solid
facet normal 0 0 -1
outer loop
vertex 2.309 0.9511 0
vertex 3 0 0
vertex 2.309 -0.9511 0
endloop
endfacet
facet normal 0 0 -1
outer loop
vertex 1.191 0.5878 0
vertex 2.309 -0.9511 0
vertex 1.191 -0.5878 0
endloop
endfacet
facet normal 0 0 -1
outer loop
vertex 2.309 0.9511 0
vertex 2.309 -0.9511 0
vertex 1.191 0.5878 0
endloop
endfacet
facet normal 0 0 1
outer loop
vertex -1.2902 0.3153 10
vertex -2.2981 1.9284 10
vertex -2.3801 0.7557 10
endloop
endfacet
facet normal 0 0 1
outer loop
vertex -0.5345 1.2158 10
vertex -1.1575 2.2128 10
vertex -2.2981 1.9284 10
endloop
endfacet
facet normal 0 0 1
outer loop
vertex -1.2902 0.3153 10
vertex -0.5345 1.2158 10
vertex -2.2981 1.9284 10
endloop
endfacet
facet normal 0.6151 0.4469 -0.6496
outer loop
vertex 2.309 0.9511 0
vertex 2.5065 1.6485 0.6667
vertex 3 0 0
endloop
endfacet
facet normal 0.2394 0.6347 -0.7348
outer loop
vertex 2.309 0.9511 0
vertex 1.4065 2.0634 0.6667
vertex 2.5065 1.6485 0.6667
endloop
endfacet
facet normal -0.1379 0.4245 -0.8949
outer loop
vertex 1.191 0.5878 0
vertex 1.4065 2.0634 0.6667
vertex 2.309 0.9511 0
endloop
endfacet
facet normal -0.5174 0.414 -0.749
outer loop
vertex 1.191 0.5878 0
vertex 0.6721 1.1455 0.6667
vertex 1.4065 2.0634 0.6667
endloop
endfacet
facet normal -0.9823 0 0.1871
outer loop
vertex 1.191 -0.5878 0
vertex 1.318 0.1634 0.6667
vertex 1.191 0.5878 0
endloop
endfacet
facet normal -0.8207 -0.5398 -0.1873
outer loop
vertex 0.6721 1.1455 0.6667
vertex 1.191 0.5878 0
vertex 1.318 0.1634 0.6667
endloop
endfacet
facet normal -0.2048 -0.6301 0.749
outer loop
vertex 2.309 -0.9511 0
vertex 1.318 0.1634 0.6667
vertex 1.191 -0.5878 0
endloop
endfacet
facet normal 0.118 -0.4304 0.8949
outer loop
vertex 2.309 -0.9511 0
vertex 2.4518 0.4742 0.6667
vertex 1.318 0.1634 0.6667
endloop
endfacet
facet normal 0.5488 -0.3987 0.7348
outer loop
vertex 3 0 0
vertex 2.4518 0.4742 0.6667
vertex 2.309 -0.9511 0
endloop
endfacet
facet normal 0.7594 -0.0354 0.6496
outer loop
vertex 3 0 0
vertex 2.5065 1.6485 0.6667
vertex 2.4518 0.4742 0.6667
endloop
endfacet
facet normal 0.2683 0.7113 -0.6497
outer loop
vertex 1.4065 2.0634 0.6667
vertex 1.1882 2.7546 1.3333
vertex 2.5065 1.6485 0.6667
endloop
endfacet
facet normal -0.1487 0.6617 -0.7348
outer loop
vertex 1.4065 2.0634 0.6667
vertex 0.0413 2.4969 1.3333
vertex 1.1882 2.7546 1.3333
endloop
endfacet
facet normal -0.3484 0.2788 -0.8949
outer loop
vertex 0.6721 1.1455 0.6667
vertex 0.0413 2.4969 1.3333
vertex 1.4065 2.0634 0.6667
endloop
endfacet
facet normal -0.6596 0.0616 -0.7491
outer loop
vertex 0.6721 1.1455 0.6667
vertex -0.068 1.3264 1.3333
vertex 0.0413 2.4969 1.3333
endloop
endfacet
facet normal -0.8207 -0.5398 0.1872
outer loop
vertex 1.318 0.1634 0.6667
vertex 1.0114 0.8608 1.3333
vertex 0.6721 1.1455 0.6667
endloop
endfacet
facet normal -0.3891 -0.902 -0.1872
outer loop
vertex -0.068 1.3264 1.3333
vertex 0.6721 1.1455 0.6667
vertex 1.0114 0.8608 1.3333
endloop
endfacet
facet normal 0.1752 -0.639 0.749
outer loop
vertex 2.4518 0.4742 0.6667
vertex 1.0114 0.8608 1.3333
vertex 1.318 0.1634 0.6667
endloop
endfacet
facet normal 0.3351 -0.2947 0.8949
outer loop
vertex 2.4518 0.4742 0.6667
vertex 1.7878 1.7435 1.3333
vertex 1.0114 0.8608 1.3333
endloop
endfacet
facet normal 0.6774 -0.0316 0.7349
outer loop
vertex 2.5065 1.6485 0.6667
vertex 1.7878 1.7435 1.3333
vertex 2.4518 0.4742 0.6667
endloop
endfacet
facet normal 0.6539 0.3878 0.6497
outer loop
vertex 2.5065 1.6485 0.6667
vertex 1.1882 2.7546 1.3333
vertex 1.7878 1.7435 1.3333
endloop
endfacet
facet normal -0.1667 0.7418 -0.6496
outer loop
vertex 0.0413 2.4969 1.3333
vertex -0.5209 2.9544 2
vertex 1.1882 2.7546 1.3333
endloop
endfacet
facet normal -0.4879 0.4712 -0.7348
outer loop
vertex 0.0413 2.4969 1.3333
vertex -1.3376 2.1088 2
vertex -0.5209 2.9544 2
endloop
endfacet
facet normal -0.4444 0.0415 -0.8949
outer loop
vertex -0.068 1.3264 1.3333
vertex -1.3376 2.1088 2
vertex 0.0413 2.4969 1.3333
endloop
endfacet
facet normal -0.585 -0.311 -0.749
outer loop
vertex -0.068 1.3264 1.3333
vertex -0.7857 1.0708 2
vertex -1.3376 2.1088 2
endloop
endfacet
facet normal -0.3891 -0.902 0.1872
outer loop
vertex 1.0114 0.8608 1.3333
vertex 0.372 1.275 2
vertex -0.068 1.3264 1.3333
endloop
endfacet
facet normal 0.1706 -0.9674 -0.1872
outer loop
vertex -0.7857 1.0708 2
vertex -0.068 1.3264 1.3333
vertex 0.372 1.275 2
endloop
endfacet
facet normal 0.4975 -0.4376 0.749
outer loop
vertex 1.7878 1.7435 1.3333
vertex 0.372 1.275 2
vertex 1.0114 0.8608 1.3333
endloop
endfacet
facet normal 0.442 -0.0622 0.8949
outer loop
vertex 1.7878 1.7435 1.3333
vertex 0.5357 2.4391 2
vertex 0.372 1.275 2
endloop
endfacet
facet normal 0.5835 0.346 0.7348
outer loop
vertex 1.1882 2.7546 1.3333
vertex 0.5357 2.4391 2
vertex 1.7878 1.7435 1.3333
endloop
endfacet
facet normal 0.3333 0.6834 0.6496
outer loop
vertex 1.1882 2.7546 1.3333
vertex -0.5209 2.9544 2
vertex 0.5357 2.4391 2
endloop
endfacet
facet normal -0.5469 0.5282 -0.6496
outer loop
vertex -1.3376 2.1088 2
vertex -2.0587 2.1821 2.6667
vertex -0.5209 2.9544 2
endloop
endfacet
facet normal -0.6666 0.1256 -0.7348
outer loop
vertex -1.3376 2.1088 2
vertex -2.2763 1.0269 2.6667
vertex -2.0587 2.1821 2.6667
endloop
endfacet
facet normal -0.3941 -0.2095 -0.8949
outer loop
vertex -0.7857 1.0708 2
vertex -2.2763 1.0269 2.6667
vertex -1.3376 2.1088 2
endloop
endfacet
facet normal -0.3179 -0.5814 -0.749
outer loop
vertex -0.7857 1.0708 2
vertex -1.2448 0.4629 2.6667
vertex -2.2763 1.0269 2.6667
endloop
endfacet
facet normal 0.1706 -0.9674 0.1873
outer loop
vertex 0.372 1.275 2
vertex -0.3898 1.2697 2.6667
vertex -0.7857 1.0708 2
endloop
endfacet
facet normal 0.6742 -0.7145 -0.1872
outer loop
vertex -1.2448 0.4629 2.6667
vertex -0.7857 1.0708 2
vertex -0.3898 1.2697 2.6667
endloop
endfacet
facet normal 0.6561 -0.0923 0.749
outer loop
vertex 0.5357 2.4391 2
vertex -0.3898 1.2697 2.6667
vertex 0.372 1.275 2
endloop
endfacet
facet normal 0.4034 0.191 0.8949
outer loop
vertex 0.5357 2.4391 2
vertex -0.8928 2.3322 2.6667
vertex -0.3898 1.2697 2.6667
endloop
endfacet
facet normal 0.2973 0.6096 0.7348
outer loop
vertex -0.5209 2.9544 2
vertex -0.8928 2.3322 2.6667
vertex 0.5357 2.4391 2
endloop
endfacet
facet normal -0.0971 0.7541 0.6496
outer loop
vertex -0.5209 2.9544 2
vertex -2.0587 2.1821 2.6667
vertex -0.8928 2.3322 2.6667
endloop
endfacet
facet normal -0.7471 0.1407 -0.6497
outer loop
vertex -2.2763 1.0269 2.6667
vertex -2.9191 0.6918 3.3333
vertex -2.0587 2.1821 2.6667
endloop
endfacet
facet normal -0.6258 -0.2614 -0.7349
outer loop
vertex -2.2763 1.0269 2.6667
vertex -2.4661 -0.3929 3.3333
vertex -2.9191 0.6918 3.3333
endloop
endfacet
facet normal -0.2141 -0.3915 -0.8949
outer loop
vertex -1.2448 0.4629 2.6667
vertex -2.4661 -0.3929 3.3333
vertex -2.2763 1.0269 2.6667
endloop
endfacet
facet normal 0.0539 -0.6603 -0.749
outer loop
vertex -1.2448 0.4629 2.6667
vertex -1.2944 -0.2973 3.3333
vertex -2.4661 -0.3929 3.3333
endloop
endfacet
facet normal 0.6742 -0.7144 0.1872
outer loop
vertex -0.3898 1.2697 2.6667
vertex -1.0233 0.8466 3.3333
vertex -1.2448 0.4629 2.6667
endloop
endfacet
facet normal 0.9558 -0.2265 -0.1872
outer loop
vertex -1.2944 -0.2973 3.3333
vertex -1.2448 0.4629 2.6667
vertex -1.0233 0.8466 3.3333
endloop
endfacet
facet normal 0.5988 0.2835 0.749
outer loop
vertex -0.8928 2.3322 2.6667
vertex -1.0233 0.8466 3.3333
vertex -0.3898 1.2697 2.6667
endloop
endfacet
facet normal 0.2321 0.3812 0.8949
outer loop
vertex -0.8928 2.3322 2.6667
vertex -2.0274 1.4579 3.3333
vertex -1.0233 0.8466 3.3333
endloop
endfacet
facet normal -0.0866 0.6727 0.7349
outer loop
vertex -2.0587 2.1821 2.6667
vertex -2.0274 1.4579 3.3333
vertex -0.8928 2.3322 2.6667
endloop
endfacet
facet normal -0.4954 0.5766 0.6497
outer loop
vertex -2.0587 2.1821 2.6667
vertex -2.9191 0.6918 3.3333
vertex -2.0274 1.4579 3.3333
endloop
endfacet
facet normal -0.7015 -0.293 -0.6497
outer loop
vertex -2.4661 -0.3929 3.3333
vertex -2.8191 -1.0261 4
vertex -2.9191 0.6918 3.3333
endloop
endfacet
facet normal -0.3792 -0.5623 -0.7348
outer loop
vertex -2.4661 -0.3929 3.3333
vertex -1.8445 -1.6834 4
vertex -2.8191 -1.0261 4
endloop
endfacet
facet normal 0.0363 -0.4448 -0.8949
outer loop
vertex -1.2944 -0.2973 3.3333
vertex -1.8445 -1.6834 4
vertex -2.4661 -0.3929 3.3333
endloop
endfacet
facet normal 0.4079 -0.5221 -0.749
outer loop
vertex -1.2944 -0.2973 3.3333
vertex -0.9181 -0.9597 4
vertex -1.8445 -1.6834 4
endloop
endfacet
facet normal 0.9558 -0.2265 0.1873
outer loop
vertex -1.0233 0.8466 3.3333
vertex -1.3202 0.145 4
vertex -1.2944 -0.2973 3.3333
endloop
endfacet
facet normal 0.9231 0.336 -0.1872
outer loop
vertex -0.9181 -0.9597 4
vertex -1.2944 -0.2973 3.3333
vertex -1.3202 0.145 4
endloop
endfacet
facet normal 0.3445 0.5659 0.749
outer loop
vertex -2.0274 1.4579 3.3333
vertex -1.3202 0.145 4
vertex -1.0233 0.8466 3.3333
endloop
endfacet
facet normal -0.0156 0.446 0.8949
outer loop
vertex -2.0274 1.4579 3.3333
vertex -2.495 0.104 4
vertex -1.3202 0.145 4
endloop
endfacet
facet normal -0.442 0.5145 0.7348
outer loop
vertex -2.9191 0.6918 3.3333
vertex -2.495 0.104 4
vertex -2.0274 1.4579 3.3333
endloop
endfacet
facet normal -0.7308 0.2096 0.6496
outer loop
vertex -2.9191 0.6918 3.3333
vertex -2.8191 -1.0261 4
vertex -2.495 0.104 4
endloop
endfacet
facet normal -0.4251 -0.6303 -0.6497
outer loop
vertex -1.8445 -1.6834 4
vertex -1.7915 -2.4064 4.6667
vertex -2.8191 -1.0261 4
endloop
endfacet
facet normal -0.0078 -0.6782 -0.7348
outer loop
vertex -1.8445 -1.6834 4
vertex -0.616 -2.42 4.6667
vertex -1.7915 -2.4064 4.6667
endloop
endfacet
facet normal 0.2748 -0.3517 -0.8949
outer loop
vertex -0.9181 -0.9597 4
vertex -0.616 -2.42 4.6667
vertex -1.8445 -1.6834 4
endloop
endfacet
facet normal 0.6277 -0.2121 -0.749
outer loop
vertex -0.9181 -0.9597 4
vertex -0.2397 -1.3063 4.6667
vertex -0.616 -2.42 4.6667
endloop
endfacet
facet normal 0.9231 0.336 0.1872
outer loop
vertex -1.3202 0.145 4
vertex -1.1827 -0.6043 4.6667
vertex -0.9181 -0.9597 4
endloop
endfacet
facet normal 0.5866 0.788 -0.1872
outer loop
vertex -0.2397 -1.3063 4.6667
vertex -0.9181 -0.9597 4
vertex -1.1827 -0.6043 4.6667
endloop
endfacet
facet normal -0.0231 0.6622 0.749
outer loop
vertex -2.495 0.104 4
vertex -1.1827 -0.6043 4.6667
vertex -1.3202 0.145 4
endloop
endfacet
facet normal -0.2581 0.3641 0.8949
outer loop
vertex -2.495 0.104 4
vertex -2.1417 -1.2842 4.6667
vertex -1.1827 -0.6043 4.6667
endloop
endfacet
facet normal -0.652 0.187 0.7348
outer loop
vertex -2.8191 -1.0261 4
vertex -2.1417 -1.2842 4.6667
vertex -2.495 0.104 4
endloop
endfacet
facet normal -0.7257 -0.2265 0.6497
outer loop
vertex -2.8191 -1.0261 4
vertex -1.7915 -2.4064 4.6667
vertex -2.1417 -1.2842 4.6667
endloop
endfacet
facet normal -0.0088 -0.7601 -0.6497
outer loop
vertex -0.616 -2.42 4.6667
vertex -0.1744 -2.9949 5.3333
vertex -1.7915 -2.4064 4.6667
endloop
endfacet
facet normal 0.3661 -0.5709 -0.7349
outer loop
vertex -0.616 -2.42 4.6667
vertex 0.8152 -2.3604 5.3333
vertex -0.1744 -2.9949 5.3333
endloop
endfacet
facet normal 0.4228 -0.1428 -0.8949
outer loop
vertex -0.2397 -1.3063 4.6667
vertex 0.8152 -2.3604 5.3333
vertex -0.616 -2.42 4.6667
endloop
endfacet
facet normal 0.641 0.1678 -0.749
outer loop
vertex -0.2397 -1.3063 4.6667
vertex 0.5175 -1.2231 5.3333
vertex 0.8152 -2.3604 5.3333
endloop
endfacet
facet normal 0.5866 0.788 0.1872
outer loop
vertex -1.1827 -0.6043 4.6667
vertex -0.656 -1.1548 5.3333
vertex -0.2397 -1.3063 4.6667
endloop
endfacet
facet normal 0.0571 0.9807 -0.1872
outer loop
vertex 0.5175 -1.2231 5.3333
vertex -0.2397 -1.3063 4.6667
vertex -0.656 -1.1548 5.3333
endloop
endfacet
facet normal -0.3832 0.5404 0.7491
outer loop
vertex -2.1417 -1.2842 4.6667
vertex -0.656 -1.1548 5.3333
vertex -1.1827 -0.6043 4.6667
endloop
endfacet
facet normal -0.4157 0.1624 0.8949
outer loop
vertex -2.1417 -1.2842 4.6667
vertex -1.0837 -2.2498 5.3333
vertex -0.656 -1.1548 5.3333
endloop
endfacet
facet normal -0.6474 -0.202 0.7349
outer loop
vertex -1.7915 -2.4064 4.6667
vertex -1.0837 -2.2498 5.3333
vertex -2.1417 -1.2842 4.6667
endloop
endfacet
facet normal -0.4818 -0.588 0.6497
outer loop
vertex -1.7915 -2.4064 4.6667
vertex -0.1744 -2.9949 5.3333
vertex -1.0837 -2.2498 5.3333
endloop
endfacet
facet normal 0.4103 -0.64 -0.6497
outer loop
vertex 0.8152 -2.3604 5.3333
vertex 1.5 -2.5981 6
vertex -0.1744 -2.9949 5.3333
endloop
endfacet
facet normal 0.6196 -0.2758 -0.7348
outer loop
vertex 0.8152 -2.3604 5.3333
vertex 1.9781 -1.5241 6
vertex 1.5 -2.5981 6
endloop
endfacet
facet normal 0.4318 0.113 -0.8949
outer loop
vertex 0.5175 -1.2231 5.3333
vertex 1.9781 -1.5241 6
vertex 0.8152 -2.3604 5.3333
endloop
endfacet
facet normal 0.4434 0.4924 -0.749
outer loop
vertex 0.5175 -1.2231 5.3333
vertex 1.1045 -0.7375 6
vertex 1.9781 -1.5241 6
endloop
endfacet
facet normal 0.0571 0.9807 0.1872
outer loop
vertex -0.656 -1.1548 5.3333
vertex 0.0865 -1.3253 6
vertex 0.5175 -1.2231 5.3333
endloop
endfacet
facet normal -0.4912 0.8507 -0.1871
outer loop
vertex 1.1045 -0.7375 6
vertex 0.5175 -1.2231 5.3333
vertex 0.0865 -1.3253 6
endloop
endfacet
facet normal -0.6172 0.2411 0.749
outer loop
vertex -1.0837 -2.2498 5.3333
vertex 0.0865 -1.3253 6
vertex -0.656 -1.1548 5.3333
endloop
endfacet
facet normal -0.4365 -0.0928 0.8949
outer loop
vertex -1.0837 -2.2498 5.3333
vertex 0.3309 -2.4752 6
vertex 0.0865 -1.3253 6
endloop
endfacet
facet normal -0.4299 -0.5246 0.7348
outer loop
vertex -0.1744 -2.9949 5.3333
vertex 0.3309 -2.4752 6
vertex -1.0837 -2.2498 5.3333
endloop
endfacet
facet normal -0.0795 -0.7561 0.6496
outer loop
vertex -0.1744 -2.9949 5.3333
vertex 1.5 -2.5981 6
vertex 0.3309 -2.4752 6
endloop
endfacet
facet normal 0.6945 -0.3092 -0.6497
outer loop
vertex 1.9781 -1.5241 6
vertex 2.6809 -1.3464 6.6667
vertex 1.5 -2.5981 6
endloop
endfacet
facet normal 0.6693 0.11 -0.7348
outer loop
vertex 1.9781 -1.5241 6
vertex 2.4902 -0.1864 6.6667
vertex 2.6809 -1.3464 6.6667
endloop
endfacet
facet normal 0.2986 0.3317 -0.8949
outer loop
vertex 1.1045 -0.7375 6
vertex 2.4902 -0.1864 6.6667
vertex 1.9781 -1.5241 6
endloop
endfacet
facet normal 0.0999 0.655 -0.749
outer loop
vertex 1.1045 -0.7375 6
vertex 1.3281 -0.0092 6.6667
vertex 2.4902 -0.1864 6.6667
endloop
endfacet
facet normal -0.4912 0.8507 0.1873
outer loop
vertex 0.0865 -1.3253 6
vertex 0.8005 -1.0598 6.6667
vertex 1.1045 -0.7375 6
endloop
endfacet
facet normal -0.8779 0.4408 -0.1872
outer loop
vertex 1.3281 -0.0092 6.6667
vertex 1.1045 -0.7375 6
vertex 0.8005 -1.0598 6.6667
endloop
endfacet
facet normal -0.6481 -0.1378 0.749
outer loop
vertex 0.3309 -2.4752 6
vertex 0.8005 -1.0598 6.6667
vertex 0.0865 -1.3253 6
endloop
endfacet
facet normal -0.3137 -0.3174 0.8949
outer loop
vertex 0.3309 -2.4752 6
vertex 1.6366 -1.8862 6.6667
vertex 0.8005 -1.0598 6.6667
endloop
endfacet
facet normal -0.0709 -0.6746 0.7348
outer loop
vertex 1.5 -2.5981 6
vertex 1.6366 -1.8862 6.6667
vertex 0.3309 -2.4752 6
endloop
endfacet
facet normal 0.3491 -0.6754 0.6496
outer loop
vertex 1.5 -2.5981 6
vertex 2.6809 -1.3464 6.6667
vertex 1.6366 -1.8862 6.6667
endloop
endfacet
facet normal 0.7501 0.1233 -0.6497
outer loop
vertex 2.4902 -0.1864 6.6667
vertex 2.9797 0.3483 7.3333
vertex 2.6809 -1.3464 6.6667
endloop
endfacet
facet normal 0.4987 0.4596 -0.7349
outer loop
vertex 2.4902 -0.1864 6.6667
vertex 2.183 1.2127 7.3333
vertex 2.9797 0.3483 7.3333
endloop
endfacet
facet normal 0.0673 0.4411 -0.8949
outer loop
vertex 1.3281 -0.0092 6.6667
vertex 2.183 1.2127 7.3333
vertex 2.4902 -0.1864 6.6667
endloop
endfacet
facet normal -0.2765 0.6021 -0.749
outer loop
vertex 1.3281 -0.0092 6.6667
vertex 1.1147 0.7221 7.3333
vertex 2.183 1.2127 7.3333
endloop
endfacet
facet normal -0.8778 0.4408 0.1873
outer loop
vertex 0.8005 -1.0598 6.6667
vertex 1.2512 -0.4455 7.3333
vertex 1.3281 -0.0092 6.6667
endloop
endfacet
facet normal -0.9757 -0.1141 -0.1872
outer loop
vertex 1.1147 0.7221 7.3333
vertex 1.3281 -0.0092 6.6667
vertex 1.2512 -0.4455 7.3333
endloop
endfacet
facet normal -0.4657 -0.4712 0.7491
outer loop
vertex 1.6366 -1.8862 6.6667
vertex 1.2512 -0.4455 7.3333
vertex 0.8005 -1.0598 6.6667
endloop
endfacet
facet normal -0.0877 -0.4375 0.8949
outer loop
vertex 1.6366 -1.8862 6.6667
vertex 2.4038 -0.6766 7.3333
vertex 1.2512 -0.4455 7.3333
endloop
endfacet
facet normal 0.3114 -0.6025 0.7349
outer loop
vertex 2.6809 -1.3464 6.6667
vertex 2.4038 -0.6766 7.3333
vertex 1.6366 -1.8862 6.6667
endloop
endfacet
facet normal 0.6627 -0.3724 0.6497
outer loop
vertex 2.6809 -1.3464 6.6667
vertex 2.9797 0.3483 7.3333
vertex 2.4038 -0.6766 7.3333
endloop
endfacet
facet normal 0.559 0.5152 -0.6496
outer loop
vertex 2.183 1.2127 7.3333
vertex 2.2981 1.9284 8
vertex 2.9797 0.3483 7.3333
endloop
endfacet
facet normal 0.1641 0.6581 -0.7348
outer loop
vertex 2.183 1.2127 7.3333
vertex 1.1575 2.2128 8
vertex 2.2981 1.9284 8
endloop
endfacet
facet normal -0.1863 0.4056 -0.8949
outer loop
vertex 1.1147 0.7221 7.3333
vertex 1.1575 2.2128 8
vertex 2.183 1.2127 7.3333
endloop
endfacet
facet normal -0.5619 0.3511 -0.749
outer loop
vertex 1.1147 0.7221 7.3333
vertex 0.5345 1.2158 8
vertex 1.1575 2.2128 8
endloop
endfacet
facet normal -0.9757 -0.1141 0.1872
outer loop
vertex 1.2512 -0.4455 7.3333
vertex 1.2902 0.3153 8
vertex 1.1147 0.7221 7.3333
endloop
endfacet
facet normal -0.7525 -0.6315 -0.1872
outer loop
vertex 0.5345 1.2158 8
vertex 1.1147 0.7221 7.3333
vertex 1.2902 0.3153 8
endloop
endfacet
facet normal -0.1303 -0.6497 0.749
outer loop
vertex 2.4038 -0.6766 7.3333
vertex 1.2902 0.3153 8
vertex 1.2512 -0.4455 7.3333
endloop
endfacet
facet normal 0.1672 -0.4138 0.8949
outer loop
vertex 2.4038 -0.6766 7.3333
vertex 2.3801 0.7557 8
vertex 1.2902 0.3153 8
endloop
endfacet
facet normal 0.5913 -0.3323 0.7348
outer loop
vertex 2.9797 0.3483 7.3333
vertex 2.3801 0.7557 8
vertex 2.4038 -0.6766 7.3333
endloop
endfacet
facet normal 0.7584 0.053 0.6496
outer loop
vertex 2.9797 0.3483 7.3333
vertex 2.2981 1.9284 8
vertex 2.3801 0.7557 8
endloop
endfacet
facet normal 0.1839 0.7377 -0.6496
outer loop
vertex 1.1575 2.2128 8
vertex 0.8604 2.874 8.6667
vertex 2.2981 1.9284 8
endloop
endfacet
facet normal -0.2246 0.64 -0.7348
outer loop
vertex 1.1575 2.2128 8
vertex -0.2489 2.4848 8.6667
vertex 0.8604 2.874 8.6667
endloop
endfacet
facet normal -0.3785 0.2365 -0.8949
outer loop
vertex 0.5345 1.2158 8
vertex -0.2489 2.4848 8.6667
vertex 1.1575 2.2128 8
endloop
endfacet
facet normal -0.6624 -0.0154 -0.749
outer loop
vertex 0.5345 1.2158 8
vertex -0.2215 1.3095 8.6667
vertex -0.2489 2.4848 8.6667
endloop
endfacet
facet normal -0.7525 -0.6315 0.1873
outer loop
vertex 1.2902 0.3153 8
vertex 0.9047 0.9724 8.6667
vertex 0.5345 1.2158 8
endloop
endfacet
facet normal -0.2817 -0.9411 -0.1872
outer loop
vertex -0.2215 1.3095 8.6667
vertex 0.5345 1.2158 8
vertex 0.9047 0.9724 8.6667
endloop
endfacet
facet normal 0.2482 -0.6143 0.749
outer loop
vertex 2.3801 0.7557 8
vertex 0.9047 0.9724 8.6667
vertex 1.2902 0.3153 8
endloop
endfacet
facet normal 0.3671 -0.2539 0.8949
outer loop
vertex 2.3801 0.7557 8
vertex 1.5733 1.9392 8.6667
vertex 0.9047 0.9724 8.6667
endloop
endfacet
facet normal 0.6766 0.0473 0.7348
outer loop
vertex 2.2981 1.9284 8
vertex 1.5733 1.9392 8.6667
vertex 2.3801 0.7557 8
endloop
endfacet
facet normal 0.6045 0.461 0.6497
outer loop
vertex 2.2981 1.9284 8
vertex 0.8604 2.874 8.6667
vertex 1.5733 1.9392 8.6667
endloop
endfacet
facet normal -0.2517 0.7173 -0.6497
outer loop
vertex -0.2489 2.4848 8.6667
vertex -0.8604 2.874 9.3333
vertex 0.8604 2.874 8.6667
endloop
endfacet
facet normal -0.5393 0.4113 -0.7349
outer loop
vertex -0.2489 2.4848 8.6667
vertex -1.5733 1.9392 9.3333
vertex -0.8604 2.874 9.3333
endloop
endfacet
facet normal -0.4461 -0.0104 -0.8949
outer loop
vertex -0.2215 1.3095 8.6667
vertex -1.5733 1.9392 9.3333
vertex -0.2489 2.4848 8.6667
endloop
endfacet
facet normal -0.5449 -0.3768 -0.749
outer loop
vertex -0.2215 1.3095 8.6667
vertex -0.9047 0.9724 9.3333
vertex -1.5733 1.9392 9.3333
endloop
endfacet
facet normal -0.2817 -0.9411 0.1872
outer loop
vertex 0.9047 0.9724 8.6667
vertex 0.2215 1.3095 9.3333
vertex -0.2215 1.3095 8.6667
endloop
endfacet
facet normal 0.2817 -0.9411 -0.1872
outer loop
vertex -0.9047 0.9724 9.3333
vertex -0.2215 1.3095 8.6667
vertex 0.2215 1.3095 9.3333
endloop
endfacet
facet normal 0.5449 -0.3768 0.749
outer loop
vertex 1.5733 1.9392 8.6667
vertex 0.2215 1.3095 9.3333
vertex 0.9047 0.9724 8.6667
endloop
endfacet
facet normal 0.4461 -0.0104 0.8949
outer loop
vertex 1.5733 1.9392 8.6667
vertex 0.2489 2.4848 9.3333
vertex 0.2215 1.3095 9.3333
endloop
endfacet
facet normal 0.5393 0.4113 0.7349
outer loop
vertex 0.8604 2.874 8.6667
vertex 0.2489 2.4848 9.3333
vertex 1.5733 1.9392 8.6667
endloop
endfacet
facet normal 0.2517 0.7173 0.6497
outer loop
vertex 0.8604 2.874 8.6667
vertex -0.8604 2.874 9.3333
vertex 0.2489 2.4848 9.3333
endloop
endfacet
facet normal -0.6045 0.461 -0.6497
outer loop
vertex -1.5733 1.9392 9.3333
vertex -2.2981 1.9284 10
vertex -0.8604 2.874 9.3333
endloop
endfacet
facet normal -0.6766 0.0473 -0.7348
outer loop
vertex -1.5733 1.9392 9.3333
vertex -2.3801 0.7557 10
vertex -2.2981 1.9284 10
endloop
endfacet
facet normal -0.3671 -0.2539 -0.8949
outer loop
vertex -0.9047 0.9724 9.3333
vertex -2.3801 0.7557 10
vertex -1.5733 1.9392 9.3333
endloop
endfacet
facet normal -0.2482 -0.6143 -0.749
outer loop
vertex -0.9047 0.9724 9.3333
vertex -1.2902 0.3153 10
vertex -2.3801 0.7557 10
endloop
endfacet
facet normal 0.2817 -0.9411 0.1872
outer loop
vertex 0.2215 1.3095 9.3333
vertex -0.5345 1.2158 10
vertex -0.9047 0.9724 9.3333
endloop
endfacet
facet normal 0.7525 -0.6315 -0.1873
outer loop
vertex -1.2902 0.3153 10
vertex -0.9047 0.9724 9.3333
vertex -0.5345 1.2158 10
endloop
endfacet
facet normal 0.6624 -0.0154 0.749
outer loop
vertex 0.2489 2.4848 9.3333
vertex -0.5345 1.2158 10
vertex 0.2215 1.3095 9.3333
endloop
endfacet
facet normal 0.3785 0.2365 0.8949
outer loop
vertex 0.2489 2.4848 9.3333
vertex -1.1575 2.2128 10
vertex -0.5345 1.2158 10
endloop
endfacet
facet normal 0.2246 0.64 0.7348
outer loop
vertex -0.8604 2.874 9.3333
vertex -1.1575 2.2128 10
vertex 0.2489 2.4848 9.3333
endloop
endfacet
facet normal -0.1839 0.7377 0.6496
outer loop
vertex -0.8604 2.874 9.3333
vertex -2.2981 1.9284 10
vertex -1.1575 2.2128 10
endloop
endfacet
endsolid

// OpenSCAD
linear_extrude(height = 10, center = false, convexity = 10, twist = -500)
translate([2, 0, 0])
circle(r = 1);
